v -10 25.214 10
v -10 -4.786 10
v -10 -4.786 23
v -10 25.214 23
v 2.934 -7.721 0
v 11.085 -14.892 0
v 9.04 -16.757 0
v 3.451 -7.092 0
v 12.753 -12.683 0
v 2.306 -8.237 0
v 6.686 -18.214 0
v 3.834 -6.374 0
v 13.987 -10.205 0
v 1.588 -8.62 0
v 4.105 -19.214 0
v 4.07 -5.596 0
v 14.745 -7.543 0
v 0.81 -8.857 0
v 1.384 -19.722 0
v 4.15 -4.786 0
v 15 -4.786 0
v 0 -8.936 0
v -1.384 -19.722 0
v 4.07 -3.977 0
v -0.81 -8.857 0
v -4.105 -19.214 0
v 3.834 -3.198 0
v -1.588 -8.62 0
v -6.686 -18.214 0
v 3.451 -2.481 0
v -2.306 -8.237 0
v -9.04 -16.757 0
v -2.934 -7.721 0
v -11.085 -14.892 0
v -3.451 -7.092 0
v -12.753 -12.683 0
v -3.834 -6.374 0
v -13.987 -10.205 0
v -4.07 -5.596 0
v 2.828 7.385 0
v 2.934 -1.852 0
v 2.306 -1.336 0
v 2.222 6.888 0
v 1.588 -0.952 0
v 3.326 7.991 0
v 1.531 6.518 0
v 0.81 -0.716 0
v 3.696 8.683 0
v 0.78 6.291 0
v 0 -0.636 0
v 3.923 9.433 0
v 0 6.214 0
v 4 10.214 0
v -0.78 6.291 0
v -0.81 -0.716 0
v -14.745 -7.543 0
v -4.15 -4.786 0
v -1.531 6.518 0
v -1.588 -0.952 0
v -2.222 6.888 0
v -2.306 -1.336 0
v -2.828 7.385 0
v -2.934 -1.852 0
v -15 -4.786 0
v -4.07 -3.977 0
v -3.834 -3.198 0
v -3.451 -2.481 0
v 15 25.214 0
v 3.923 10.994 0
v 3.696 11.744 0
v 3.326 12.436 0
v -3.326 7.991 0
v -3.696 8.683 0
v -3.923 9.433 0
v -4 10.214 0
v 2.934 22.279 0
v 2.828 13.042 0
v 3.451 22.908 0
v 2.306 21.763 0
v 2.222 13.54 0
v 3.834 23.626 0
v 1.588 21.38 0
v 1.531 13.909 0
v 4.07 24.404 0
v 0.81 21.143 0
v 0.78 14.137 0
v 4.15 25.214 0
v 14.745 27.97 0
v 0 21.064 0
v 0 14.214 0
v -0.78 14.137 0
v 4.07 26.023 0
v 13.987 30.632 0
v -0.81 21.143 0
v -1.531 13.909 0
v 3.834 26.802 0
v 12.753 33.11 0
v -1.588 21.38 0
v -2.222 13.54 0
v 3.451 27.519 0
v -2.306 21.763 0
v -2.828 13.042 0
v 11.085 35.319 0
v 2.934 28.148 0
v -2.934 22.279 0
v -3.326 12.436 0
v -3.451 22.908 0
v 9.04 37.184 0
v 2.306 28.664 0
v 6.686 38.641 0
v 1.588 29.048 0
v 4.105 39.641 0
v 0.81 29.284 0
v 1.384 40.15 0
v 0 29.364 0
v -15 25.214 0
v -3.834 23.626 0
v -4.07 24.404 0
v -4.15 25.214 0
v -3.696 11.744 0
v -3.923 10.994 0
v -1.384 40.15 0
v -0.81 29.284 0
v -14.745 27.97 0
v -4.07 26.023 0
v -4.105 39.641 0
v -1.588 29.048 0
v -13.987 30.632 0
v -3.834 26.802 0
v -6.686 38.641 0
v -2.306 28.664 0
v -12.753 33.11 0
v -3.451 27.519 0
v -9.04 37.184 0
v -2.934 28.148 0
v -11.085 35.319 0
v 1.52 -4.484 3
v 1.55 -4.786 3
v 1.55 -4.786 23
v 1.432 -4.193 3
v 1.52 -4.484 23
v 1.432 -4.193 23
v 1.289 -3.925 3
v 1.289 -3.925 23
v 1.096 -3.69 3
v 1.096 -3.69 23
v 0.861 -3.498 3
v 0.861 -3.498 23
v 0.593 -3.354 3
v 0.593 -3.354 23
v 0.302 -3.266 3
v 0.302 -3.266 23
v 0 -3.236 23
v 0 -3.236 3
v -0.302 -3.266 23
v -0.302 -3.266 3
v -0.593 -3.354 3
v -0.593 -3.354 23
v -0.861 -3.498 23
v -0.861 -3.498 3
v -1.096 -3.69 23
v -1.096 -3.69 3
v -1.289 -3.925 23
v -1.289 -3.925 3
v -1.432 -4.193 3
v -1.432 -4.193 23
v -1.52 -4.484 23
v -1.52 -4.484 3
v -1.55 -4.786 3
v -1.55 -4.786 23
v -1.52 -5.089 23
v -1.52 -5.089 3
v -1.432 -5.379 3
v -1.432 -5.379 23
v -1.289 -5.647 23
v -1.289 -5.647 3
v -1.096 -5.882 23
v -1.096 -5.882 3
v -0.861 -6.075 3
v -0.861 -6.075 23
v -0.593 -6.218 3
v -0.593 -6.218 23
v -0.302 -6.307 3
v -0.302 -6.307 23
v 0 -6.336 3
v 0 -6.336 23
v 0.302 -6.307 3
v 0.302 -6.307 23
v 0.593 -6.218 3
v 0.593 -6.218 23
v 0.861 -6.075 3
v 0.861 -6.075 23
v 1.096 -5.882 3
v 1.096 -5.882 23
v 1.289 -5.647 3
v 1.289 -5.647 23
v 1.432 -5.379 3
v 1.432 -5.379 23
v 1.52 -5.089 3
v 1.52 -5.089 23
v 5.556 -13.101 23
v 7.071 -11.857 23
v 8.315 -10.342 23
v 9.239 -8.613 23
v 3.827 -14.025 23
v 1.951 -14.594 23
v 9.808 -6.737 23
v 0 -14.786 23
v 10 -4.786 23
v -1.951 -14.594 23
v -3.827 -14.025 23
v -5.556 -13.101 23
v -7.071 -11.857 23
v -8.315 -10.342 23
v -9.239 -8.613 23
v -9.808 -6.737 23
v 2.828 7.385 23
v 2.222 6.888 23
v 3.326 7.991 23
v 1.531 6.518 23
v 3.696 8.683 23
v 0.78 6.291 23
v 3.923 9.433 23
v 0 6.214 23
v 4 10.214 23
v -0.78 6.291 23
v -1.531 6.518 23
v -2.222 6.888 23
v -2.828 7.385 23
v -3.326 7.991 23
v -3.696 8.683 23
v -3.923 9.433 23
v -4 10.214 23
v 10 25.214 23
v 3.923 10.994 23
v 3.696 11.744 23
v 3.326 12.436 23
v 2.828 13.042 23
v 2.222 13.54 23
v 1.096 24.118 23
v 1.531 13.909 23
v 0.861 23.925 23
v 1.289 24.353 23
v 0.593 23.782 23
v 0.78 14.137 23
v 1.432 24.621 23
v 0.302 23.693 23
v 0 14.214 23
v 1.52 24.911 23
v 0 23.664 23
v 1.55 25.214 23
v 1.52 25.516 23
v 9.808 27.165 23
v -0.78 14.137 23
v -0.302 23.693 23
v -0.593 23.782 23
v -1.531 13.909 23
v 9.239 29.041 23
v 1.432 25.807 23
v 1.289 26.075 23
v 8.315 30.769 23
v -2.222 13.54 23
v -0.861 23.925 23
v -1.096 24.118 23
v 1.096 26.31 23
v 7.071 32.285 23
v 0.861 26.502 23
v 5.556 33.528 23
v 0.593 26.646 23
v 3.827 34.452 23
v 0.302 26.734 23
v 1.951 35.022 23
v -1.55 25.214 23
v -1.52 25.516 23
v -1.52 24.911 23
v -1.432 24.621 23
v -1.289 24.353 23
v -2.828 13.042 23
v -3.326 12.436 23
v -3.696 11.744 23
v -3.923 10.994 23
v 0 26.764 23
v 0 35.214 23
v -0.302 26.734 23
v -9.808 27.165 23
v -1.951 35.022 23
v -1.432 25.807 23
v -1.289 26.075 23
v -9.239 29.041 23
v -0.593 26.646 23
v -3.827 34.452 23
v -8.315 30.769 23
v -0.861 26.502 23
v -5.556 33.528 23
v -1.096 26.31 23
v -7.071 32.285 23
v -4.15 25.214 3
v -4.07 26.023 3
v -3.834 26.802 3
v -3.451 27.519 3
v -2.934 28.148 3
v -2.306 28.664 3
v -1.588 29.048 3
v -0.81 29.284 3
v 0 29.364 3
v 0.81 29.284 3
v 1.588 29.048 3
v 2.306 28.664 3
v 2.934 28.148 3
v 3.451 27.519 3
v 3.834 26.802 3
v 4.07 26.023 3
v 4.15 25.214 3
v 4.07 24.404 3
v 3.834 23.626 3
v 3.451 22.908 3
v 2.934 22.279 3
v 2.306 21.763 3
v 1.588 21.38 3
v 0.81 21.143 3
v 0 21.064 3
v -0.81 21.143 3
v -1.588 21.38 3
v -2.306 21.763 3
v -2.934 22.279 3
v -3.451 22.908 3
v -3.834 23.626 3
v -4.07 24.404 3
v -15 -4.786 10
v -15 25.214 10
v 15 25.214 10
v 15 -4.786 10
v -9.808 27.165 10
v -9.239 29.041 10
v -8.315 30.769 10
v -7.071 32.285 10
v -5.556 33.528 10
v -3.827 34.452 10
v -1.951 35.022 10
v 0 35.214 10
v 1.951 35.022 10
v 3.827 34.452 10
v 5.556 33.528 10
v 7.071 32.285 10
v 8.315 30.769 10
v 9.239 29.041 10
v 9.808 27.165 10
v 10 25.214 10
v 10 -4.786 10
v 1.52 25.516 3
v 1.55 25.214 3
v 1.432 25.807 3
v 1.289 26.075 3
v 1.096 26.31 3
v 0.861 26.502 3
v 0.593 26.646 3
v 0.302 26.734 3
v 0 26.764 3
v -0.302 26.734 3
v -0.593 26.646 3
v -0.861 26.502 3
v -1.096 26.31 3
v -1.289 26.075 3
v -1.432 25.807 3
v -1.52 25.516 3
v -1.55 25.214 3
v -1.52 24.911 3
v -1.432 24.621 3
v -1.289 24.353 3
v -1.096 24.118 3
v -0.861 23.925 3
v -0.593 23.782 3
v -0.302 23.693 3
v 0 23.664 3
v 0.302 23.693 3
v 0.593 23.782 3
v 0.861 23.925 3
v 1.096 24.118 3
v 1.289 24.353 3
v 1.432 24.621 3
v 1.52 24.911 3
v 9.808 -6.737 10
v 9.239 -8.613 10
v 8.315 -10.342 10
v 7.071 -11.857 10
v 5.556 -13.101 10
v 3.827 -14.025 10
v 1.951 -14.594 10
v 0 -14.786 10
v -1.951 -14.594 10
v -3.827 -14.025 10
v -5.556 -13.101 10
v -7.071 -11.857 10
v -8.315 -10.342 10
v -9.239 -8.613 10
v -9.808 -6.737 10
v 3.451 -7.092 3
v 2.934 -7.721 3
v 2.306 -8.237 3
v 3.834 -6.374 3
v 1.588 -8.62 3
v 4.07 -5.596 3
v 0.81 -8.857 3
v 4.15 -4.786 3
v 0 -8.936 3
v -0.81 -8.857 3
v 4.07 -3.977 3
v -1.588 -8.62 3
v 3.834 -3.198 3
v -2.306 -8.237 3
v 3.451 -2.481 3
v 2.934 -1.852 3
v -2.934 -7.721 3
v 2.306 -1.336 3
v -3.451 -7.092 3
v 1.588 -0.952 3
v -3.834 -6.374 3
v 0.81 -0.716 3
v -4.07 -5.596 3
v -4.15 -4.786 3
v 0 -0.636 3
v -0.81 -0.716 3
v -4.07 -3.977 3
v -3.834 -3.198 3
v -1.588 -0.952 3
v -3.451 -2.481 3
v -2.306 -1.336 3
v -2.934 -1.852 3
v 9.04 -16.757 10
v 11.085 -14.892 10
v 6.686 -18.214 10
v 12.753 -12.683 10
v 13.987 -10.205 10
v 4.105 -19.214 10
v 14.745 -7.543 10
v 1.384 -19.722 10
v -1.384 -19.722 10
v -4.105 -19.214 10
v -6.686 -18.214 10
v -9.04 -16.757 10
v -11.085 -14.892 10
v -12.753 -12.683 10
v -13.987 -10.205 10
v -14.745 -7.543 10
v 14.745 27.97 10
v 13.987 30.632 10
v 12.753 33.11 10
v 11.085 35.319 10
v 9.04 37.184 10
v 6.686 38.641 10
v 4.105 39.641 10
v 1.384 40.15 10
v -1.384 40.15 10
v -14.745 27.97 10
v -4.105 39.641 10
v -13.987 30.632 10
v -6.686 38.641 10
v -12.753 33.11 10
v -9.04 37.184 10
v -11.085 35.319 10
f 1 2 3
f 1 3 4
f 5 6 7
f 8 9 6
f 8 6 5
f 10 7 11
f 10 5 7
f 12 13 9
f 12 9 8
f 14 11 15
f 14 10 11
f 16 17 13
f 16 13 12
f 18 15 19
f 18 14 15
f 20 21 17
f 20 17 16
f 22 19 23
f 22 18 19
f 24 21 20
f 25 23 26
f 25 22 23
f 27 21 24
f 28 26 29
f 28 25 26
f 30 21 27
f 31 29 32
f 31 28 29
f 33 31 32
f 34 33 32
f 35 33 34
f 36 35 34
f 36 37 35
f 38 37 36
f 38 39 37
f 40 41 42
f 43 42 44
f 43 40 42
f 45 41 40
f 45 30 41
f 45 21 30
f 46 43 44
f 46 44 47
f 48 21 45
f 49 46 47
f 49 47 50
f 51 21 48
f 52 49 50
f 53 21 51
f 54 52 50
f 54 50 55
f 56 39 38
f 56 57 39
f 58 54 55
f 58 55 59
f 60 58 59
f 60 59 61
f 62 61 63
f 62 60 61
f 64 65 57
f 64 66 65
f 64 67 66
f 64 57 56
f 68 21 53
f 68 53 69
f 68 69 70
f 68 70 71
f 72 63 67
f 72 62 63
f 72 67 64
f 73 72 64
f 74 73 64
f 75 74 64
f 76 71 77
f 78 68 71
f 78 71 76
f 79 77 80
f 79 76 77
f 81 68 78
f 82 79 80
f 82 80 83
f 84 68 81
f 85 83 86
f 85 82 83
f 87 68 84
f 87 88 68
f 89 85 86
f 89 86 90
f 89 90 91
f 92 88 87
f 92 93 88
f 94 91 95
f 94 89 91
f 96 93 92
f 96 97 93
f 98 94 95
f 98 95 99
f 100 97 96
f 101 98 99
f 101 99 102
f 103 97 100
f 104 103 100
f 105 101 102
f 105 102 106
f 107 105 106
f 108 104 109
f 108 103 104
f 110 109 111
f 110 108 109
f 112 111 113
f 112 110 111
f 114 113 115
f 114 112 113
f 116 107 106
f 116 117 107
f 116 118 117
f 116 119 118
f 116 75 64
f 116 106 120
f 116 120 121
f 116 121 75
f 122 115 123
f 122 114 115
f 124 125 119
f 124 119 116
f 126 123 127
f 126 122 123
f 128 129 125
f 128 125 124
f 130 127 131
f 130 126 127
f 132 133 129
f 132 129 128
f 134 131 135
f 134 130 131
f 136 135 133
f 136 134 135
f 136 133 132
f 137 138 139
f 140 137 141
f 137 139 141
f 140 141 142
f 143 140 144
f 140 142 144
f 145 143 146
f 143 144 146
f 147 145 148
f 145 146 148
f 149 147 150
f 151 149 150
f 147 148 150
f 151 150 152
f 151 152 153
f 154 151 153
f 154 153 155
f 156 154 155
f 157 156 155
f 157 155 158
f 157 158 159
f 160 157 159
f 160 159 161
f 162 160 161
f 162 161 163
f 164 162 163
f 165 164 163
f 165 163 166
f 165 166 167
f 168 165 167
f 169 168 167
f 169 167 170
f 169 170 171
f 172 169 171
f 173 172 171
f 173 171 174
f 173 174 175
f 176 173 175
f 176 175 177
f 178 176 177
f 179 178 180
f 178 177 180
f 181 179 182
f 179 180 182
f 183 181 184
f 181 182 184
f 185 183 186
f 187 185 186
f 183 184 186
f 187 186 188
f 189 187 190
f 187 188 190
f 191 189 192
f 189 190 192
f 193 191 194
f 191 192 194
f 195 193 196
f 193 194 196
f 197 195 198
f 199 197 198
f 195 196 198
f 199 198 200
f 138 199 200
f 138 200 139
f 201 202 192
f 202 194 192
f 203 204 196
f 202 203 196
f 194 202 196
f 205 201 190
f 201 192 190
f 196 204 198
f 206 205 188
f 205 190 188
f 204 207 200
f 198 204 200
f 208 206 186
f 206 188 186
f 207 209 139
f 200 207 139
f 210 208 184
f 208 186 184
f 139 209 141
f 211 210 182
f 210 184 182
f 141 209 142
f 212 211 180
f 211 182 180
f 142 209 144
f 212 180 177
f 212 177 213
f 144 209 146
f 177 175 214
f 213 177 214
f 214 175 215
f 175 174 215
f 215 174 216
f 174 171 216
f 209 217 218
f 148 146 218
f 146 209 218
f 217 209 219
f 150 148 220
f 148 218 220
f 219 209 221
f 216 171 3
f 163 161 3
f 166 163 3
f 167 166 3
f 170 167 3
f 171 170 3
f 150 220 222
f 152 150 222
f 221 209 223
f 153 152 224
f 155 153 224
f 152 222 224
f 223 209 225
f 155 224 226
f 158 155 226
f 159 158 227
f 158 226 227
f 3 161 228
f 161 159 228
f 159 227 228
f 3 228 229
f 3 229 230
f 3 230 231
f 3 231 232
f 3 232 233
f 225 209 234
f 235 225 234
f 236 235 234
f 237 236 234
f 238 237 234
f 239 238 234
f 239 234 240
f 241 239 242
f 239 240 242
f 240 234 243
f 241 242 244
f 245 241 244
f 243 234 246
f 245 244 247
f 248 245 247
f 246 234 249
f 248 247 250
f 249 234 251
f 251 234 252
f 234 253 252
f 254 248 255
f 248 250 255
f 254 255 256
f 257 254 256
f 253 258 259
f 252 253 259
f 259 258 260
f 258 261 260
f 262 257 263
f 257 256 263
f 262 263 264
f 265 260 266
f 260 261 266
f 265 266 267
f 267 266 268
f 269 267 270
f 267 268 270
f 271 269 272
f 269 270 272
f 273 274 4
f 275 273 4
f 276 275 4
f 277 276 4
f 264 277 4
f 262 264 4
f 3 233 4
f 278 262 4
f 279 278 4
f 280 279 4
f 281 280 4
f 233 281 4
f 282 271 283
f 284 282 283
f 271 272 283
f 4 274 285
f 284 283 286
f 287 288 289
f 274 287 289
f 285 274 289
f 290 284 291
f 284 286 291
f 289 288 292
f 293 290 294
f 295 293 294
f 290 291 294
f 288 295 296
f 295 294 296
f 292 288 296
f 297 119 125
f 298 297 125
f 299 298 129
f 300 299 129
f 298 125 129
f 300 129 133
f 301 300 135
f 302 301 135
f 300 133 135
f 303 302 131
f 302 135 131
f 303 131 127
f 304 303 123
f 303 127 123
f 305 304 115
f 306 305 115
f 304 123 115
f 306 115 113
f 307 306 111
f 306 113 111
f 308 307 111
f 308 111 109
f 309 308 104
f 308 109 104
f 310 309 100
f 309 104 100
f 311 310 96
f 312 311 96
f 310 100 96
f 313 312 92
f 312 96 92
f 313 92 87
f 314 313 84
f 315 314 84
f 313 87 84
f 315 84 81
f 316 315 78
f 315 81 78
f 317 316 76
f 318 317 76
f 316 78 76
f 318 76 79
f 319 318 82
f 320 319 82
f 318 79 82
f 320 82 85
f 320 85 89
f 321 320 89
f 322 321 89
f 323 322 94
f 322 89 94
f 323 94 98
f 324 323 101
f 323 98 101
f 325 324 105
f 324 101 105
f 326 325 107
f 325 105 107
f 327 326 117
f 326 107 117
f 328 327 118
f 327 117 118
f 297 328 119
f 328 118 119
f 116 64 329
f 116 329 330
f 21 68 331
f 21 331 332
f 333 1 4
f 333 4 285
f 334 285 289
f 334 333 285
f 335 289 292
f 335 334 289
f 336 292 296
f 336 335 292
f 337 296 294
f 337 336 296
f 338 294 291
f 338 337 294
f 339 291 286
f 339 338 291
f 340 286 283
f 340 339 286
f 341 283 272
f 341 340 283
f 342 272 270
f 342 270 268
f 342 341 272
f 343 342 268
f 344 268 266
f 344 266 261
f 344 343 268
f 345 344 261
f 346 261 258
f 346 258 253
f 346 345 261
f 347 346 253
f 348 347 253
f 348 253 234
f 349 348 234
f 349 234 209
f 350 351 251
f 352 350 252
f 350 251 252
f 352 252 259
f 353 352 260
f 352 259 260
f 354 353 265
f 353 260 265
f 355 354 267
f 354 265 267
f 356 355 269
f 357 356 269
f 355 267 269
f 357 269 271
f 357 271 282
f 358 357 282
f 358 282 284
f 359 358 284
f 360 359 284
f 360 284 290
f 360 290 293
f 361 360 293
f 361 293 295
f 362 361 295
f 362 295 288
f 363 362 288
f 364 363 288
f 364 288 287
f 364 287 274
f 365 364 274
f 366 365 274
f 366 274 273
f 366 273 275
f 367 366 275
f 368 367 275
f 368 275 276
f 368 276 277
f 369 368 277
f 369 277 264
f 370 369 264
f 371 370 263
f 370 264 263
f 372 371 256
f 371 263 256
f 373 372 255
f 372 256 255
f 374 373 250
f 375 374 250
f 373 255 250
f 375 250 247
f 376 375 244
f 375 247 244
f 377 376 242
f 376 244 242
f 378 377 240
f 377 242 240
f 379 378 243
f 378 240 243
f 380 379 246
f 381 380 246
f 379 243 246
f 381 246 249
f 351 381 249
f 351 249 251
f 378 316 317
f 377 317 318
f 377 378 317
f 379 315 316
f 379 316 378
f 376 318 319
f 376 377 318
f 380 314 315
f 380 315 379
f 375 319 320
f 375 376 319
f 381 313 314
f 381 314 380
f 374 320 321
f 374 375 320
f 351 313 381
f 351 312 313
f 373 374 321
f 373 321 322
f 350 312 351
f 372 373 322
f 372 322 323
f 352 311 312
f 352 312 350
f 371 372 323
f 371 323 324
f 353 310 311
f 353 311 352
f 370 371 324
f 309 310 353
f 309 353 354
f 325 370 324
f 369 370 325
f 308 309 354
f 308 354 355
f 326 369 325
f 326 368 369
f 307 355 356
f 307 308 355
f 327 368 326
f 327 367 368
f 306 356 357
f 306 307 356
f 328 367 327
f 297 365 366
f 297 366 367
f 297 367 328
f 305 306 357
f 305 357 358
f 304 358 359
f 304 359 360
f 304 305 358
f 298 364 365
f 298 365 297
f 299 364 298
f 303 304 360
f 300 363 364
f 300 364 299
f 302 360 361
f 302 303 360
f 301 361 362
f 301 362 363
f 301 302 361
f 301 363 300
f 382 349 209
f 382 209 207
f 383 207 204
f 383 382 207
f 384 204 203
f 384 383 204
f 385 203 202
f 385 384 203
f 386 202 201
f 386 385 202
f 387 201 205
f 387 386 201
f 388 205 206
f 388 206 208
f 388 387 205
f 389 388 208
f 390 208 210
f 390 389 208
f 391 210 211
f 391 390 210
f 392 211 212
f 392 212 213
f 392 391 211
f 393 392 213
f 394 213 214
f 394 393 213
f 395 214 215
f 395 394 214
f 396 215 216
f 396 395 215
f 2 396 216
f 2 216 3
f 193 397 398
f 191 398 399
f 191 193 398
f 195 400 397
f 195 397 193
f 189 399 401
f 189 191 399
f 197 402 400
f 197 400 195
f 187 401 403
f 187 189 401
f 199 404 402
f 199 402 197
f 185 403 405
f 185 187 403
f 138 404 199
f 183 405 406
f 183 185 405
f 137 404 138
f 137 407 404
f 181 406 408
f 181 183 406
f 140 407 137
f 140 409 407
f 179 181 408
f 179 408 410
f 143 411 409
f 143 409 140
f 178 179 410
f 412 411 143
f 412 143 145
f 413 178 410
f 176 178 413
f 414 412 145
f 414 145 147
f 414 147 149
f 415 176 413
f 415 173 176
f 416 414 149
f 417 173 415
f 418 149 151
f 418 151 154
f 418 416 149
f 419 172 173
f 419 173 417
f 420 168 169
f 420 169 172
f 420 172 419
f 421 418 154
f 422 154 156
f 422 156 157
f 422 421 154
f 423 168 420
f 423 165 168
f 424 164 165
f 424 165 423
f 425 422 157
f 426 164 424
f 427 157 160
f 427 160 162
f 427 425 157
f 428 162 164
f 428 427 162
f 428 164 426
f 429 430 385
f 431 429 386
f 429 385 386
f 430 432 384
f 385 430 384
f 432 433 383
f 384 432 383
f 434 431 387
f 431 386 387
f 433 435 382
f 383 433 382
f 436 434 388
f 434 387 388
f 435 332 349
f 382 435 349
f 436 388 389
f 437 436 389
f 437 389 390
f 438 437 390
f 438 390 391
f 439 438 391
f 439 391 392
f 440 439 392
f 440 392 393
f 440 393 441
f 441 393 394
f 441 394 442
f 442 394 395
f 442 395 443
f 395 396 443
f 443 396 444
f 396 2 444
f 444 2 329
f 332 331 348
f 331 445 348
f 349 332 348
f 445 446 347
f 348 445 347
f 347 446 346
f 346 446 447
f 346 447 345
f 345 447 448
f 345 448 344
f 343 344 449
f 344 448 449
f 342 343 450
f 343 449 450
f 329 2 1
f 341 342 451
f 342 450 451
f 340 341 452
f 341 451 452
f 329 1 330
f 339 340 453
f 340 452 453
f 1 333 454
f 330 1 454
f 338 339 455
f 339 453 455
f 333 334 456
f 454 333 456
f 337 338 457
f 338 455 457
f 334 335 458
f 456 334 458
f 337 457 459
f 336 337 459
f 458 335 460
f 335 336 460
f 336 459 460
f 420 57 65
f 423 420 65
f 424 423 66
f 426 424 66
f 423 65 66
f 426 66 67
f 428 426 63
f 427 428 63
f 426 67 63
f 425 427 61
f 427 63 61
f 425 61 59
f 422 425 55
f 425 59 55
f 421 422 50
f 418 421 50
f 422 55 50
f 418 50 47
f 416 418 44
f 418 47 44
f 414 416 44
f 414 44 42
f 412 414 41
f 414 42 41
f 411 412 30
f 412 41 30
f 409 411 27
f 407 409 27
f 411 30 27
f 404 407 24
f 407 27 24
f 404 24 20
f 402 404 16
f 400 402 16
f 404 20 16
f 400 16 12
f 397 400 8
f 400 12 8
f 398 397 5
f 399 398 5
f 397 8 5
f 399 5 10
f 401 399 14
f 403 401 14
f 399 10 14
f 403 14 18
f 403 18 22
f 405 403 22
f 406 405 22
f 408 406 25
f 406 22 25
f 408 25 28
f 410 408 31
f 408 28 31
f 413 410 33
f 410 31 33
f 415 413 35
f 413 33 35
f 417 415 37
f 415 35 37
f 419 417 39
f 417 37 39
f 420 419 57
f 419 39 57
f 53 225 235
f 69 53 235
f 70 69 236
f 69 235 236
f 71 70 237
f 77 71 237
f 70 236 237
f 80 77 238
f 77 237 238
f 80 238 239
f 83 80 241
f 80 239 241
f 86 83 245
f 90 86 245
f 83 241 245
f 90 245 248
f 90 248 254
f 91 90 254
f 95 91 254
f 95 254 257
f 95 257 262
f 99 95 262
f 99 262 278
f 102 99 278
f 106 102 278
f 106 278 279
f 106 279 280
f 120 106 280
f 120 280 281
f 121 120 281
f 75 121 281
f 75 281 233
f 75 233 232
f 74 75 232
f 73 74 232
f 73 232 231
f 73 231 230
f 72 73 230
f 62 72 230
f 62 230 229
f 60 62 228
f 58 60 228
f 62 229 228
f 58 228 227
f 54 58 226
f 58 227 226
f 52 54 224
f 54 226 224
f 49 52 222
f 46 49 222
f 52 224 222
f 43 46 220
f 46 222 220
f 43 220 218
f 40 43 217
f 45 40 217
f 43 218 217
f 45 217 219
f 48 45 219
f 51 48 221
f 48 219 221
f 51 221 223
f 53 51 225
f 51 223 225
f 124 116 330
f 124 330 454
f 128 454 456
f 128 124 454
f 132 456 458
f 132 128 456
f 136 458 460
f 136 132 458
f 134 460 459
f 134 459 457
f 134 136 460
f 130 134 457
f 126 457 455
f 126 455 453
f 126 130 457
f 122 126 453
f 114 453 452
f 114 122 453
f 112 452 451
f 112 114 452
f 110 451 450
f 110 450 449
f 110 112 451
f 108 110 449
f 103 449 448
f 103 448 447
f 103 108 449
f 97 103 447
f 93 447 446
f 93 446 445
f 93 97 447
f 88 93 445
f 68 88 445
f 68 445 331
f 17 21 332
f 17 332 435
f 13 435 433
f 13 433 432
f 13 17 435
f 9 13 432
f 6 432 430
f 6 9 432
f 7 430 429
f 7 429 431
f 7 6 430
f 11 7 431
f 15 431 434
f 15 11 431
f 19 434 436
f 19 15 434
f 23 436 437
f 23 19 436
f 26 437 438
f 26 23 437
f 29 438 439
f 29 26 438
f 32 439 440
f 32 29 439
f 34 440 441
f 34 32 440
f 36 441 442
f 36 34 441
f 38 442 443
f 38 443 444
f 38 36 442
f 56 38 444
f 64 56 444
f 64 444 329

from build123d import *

# Parameters (mm, degrees)
BOSS_EXTRUDE1_DEPTH     = 23
SKETCH2_R               = 1.55
CUT_EXTRUDE1_DEPTH      = 30
BOSS_EXTRUDE2_DEPTH     = 10
SKETCH5_R               = 4
CUT_EXTRUDE3_DEPTH      = 70
ESQUISSE1_R             = 4.15
ENL_V_MAT_EXTRU_1_DEPTH = 3


with BuildPart() as part:
    # Sketch1 → Boss-Extrude1 (new body)
    with BuildSketch(Plane.XY):
        with BuildLine():
            Line((-10, -4.786331479), (-10, 25.213668521))
            ThreePointArc((-10, 25.213668521), (0, 35.213668521), (10, 25.213668521))
            Line((10, 25.213668521), (10, -4.786331479))
            ThreePointArc((10, -4.786331479), (0, -14.786331479), (-10, -4.786331479))
        make_face()
    extrude(amount=BOSS_EXTRUDE1_DEPTH)

    # Sketch2 → Cut-Extrude1 (cut)
    with BuildSketch(Plane.XY.offset(23)):
        with Locations((0, 25.213668521)):
            Circle(SKETCH2_R)
        with Locations((0, -4.786331479)):
            Circle(SKETCH2_R)
    extrude(amount=-CUT_EXTRUDE1_DEPTH, mode=Mode.SUBTRACT)

    # Sketch3 → Boss-Extrude2 (add)
    with BuildSketch(Plane(origin=(0, 0, 0), x_dir=(-1, 0, 0), z_dir=(0, 0, -1))):
        with BuildLine():
            Line((-15, 25.213668521), (-15, -4.786331479))
            ThreePointArc((-15, -4.786331479), (0, -19.786331479), (15, -4.786331479))
            Line((15, -4.786331479), (15, 25.213668521))
            ThreePointArc((15, 25.213668521), (0, 40.213668521), (-15, 25.213668521))
        make_face()
        with BuildLine():
            Line((-10, 25.213668521), (-10, -4.786331479))
            ThreePointArc((-10, -4.786331479), (0, -14.786331479), (10, -4.786331479))
            Line((10, -4.786331479), (10, 25.213668521))
            ThreePointArc((10, 25.213668521), (0, 35.213668521), (-10, 25.213668521))
        make_face(mode=Mode.SUBTRACT)
    extrude(amount=-BOSS_EXTRUDE2_DEPTH)

    # Sketch5 → Cut-Extrude3 (cut)
    with BuildSketch(Plane.XY.offset(23)):
        with Locations((0, 10.213668521)):
            Circle(SKETCH5_R)
    extrude(amount=-CUT_EXTRUDE3_DEPTH, mode=Mode.SUBTRACT)

    # Esquisse1 → Enlèv. mat.-Extru.1 (cut)
    with BuildSketch(Plane(origin=(0, 0, 0), x_dir=(-1, 0, 0), z_dir=(0, 0, -1))):
        with Locations((0, 25.213668521)):
            Circle(ESQUISSE1_R)
        with Locations((0, -4.786331479)):
            Circle(ESQUISSE1_R)
    extrude(amount=-ENL_V_MAT_EXTRU_1_DEPTH, mode=Mode.SUBTRACT)


solid = part.part
